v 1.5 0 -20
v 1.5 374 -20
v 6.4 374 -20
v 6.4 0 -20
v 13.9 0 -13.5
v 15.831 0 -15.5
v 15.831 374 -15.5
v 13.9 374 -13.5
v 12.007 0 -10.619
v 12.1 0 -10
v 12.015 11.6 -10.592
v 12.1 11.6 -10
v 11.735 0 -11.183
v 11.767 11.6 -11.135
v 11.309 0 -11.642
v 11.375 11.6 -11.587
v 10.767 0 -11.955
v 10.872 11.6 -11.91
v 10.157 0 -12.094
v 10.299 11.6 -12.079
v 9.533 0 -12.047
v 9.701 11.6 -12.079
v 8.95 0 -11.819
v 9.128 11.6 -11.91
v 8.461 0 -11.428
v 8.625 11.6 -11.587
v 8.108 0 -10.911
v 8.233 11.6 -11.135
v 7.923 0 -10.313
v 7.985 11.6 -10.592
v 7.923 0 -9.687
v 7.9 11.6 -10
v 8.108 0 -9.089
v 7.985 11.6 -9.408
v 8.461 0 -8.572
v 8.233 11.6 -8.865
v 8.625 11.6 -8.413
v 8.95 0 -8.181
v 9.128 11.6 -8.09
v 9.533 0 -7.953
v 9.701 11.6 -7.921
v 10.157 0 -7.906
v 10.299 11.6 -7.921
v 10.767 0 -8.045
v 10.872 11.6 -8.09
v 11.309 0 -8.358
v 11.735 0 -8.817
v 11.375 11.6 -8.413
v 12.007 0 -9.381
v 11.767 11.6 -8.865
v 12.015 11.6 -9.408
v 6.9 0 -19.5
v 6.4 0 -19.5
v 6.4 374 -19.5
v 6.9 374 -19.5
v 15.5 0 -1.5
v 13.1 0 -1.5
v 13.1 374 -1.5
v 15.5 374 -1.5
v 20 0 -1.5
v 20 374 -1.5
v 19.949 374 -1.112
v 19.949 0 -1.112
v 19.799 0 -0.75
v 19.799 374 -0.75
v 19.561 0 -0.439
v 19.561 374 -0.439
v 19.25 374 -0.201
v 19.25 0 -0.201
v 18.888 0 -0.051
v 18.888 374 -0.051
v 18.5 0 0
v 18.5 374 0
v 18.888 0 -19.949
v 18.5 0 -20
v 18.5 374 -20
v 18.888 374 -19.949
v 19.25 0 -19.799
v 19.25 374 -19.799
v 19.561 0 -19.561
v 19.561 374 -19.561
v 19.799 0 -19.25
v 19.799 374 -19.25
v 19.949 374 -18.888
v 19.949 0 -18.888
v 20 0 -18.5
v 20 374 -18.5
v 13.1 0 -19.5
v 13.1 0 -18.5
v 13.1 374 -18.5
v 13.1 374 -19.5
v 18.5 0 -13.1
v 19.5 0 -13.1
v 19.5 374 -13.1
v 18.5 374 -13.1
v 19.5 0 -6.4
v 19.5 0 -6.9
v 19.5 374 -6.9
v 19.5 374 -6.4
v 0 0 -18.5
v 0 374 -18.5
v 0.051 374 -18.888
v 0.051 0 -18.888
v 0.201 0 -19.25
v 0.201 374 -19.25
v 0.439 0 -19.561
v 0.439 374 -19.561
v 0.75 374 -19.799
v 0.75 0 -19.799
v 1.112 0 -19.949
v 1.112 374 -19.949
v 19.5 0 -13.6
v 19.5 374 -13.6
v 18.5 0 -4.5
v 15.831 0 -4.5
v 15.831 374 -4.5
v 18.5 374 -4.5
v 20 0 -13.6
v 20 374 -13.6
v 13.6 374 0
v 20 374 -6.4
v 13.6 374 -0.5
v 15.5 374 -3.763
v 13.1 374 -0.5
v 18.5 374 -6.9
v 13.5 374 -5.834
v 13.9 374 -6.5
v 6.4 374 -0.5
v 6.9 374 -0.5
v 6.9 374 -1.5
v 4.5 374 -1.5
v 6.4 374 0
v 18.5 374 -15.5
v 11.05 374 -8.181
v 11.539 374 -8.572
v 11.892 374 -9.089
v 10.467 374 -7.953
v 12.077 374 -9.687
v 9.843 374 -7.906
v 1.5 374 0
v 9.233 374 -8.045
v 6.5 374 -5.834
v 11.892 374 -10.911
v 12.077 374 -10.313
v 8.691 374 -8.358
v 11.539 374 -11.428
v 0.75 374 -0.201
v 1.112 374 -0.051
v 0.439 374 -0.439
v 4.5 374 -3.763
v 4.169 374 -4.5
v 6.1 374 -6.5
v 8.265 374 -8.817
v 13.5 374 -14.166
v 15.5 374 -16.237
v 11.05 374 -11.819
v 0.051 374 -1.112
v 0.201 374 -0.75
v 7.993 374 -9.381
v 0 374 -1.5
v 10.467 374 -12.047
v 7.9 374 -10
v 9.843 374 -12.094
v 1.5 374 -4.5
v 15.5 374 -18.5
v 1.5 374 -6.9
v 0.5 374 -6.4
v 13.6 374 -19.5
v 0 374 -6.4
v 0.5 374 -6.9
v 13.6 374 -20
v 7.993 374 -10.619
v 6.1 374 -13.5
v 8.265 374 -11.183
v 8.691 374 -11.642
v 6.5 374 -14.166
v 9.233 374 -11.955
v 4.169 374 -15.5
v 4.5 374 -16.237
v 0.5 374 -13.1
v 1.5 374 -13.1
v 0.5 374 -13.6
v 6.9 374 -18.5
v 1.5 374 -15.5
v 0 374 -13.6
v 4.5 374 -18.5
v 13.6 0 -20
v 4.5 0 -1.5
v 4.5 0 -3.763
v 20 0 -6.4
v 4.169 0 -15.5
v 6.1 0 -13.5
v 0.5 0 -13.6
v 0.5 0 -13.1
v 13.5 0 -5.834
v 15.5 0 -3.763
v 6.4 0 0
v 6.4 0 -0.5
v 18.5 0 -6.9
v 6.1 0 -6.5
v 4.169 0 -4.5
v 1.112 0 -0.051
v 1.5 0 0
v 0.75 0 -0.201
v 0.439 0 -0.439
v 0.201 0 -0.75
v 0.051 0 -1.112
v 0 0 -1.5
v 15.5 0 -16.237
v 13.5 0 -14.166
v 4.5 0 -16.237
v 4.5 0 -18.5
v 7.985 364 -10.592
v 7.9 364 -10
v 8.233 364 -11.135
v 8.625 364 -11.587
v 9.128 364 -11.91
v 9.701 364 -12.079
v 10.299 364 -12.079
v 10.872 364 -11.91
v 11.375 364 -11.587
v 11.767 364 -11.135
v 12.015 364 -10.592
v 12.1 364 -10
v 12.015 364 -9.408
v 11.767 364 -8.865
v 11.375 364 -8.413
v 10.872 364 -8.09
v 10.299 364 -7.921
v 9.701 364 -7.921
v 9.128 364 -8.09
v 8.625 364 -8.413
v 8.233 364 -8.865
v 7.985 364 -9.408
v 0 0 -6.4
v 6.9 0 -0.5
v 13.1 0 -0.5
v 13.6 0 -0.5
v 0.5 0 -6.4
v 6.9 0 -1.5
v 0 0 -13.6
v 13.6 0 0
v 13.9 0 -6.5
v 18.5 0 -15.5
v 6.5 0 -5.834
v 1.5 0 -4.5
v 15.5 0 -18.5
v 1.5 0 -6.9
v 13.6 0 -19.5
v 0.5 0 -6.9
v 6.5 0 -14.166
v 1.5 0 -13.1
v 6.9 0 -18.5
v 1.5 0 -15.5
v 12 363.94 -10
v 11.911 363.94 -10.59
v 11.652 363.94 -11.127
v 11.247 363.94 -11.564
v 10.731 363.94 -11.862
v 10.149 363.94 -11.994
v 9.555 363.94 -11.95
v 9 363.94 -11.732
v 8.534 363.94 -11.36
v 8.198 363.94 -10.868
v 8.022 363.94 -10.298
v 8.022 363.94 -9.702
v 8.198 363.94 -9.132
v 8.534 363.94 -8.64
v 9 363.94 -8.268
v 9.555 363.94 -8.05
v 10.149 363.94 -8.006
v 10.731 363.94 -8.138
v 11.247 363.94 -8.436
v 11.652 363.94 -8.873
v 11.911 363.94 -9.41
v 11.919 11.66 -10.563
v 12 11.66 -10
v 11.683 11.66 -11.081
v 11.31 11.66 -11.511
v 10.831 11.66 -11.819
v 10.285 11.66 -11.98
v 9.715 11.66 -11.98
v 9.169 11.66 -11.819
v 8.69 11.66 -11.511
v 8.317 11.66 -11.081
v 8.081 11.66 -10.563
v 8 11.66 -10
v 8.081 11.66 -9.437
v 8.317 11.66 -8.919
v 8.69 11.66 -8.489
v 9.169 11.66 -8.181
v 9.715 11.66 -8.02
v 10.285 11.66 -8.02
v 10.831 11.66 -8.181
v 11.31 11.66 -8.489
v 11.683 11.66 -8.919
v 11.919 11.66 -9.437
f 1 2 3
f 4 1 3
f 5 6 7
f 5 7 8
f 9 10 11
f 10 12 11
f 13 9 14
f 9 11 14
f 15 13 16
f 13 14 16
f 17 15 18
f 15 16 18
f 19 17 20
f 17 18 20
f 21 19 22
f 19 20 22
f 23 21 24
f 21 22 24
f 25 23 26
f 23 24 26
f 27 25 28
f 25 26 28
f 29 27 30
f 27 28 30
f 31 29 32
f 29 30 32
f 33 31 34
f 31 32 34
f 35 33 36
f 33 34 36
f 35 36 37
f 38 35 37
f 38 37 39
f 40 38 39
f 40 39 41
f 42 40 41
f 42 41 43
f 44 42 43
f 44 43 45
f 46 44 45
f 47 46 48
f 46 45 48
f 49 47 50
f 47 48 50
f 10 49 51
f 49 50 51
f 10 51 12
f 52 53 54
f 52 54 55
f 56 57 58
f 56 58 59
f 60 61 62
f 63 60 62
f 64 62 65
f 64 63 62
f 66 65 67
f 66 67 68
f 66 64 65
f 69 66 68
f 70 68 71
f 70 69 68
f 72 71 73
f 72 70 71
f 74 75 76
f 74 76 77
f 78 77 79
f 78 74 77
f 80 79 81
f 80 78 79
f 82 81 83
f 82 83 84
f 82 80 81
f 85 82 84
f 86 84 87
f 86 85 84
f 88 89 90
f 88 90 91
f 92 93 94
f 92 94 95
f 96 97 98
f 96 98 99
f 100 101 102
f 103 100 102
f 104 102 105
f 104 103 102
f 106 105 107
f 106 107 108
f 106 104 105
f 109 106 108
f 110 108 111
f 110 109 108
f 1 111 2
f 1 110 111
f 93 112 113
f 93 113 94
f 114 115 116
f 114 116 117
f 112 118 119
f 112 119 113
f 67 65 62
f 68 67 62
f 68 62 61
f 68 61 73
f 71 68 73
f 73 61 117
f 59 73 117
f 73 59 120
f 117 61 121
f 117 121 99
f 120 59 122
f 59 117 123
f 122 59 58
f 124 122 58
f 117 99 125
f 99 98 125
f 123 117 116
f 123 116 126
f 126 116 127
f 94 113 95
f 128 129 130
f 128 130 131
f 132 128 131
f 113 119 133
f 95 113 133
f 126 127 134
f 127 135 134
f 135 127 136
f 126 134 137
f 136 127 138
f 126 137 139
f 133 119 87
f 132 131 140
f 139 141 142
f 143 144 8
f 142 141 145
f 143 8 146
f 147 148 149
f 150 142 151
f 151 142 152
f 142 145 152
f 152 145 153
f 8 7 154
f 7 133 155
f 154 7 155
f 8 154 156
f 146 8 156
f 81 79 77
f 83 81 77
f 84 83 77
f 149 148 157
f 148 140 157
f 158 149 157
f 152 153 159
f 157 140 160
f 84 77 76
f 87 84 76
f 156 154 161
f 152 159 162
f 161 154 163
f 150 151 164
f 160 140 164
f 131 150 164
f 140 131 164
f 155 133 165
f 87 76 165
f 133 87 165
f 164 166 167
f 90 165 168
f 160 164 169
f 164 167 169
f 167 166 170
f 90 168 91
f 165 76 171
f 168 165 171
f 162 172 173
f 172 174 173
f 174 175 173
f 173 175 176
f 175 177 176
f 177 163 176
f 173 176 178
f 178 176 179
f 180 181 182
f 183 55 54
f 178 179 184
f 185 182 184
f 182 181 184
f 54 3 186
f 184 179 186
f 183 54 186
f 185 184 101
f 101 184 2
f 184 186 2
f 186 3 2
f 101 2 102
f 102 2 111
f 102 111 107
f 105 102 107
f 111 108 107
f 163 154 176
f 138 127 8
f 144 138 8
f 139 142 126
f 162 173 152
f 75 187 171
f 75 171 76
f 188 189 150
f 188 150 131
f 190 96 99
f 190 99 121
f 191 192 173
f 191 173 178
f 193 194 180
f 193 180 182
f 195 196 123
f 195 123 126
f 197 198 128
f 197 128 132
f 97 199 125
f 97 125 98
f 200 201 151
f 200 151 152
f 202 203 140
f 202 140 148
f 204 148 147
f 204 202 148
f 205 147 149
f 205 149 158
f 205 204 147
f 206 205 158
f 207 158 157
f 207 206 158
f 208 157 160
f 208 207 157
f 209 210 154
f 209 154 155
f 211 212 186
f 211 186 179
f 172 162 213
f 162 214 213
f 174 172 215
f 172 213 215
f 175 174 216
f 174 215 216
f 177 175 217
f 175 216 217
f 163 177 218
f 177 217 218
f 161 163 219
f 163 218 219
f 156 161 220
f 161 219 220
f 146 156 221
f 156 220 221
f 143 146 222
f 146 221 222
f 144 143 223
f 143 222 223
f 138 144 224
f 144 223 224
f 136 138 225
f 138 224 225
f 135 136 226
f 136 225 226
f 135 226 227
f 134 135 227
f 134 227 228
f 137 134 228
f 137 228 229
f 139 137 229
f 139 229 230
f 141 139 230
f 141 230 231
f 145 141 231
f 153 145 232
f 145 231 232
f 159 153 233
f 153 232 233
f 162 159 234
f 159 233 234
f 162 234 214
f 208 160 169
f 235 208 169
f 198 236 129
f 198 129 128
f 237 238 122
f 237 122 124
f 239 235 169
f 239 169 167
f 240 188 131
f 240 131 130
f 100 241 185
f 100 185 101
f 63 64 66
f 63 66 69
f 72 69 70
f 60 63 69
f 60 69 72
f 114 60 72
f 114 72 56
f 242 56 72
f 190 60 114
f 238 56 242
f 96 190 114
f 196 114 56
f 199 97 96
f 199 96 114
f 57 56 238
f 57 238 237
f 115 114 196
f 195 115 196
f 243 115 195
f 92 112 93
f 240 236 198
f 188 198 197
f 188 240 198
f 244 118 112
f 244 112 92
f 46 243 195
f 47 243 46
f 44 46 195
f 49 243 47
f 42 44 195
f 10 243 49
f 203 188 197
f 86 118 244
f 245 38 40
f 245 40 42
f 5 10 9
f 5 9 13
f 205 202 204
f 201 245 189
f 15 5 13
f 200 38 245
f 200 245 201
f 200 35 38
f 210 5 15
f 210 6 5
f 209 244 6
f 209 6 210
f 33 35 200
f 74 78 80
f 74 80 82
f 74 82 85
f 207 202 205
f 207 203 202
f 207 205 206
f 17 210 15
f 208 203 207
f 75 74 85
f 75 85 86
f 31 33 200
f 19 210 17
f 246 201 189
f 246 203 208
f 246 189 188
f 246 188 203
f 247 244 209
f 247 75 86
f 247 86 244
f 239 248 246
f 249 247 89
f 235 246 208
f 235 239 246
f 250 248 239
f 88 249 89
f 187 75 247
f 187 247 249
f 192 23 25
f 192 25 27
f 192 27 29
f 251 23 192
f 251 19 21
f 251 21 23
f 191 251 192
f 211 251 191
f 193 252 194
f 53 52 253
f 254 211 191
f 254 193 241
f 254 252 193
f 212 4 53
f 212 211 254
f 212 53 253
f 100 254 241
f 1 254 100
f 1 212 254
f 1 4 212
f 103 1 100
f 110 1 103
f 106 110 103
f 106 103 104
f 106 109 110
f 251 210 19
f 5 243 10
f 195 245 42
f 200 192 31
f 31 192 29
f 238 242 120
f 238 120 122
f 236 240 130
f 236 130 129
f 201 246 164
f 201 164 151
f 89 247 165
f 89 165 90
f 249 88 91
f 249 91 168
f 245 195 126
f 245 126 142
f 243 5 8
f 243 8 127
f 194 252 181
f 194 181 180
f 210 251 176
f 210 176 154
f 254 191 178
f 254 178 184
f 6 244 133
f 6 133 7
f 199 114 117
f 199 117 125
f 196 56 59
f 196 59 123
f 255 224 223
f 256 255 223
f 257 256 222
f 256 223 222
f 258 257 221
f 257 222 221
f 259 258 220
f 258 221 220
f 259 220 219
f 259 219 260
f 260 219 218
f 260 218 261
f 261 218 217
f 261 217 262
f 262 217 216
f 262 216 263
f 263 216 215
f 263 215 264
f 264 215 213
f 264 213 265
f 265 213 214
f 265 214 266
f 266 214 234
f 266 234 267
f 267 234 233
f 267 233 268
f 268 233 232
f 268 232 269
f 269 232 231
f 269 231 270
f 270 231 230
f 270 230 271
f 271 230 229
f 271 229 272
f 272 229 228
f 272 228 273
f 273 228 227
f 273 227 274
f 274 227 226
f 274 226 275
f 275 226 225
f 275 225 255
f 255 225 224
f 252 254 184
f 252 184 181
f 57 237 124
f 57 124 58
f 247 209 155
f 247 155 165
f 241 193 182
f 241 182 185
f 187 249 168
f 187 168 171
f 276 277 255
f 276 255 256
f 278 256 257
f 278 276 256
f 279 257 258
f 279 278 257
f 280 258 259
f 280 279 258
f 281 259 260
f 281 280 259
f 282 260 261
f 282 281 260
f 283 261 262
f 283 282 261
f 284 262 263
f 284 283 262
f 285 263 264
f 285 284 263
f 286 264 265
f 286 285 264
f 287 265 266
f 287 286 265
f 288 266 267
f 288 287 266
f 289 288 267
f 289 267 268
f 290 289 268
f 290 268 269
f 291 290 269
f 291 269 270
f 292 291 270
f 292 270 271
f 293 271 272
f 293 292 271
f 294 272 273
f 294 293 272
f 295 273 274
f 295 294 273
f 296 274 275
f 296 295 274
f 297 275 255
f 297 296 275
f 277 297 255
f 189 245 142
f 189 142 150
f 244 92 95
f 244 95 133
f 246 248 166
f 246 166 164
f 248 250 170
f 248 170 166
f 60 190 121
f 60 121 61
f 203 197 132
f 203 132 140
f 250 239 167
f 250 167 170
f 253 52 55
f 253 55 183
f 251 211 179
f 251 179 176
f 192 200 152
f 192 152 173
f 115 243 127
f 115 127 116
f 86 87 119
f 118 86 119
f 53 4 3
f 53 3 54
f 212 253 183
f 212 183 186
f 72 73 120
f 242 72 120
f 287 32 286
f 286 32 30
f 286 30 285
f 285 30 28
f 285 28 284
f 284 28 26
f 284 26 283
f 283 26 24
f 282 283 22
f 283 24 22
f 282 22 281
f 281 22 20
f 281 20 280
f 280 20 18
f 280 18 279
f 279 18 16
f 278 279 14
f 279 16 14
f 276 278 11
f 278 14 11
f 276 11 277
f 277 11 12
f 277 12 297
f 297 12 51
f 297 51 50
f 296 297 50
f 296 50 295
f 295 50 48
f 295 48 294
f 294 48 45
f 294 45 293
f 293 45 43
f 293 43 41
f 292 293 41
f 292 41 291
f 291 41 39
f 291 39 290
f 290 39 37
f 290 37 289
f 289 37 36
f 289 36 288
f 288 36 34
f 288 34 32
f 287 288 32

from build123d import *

# Parameters (mm, degrees)
SKETCH1_R             = 2
BOSS_EXTRUDE1_DEPTH   = 374
M5_TAPPED_HOLE1_D     = 4.2
M5_TAPPED_HOLE1_DEPTH = 10
M5_TAPPED_HOLE1_TIP   = 1.2618073
M5_TAPPED_HOLE2_D     = 4.2
M5_TAPPED_HOLE2_DEPTH = 11.6
M5_TAPPED_HOLE2_TIP   = 1.2618073


with BuildPart() as part:
    # Sketch1 → Boss-Extrude1 (new body)
    with BuildSketch(Plane(origin=(0, 0, 0), x_dir=(1, 0, 0), z_dir=(0, 1, 0))):
        with BuildLine():
            Line((1.5, 20), (6.4, 20))
            Line((6.4, 20), (6.4, 19.5))
            Line((6.4, 19.5), (6.9, 19.5))
            Line((6.9, 19.5), (6.9, 18.5))
            Line((6.9, 18.5), (4.5, 18.5))
            Line((4.5, 18.5), (4.5, 16.237261743))
            Line((4.5, 16.237261743), (6.5, 14.165503925))
            Line((6.5, 14.165503925), (13.5, 14.165503925))
            Line((13.5, 14.165503925), (15.5, 16.237261743))
            Line((15.5, 16.237261743), (15.5, 18.5))
            Line((15.5, 18.5), (13.1, 18.5))
            Line((13.1, 18.5), (13.1, 19.5))
            Line((13.1, 19.5), (13.6, 19.5))
            Line((13.6, 19.5), (13.6, 20))
            Line((13.6, 20), (18.5, 20))
            ThreePointArc((18.5, 20), (19.560660172, 19.560660172), (20, 18.5))
            Line((20, 18.5), (20, 13.6))
            Line((20, 13.6), (19.5, 13.6))
            Line((19.5, 13.6), (19.5, 13.1))
            Line((19.5, 13.1), (18.5, 13.1))
            Line((18.5, 13.1), (18.5, 15.5))
            Line((18.5, 15.5), (15.8307276, 15.5))
            Line((15.8307276, 15.5), (13.9, 13.5))
            Line((13.9, 13.5), (13.9, 6.5))
            Line((13.9, 6.5), (15.8307276, 4.5))
            Line((15.8307276, 4.5), (18.5, 4.5))
            Line((18.5, 4.5), (18.5, 6.9))
            Line((18.5, 6.9), (19.5, 6.9))
            Line((19.5, 6.9), (19.5, 6.4))
            Line((19.5, 6.4), (20, 6.4))
            Line((20, 6.4), (20, 1.5))
            ThreePointArc((20, 1.5), (19.560660172, 0.439339828), (18.5, 0))
            Line((18.5, 0), (13.6, 0))
            Line((13.6, 0), (13.6, 0.5))
            Line((13.6, 0.5), (13.1, 0.5))
            Line((13.1, 0.5), (13.1, 1.5))
            Line((13.1, 1.5), (15.5, 1.5))
            Line((15.5, 1.5), (15.5, 3.762738257))
            Line((15.5, 3.762738257), (13.5, 5.834496075))
            Line((13.5, 5.834496075), (6.5, 5.834496075))
            Line((6.5, 5.834496075), (4.5, 3.762738257))
            Line((4.5, 3.762738257), (4.5, 1.5))
            Line((4.5, 1.5), (6.9, 1.5))
            Line((6.9, 1.5), (6.9, 0.5))
            Line((6.9, 0.5), (6.4, 0.5))
            Line((6.4, 0.5), (6.4, 0))
            Line((6.4, 0), (1.5, 0))
            ThreePointArc((1.5, 0), (0.439339828, 0.439339828), (0, 1.5))
            Line((0, 1.5), (0, 6.4))
            Line((0, 6.4), (0.5, 6.4))
            Line((0.5, 6.4), (0.5, 6.9))
            Line((0.5, 6.9), (1.5, 6.9))
            Line((1.5, 6.9), (1.5, 4.5))
            Line((1.5, 4.5), (4.1692724, 4.5))
            Line((4.1692724, 4.5), (6.1, 6.5))
            Line((6.1, 6.5), (6.1, 13.5))
            Line((6.1, 13.5), (4.1692724, 15.5))
            Line((4.1692724, 15.5), (1.5, 15.5))
            Line((1.5, 15.5), (1.5, 13.1))
            Line((1.5, 13.1), (0.5, 13.1))
            Line((0.5, 13.1), (0.5, 13.6))
            Line((0.5, 13.6), (0, 13.6))
            Line((0, 13.6), (0, 18.5))
            ThreePointArc((0, 18.5), (0.439339828, 19.560660172), (1.5, 20))
        make_face()
        with Locations((10, 10)):
            Circle(SKETCH1_R, mode=Mode.SUBTRACT)
    extrude(amount=BOSS_EXTRUDE1_DEPTH)

    # M5 Tapped Hole1
    with Locations(Plane(origin=(0, 374, 0), x_dir=(1, 0, 0), z_dir=(0, 1, 0))):
        with Locations((10, 10)):
            Hole(M5_TAPPED_HOLE1_D / 2, depth=M5_TAPPED_HOLE1_DEPTH)
            with Locations((0, 0, -(M5_TAPPED_HOLE1_DEPTH + M5_TAPPED_HOLE1_TIP / 2))):  # 118° drill point
                Cone(0, M5_TAPPED_HOLE1_D / 2, M5_TAPPED_HOLE1_TIP, mode=Mode.SUBTRACT)

    # M5 Tapped Hole2
    with Locations(Plane(origin=(0, 0, 0), x_dir=(-1, 0, 0), z_dir=(0, -1, 0))):
        with Locations((-10, 10)):
            Hole(M5_TAPPED_HOLE2_D / 2, depth=M5_TAPPED_HOLE2_DEPTH)
            with Locations((0, 0, -(M5_TAPPED_HOLE2_DEPTH + M5_TAPPED_HOLE2_TIP / 2))):  # 118° drill point
                Cone(0, M5_TAPPED_HOLE2_D / 2, M5_TAPPED_HOLE2_TIP, mode=Mode.SUBTRACT)


solid = part.part
